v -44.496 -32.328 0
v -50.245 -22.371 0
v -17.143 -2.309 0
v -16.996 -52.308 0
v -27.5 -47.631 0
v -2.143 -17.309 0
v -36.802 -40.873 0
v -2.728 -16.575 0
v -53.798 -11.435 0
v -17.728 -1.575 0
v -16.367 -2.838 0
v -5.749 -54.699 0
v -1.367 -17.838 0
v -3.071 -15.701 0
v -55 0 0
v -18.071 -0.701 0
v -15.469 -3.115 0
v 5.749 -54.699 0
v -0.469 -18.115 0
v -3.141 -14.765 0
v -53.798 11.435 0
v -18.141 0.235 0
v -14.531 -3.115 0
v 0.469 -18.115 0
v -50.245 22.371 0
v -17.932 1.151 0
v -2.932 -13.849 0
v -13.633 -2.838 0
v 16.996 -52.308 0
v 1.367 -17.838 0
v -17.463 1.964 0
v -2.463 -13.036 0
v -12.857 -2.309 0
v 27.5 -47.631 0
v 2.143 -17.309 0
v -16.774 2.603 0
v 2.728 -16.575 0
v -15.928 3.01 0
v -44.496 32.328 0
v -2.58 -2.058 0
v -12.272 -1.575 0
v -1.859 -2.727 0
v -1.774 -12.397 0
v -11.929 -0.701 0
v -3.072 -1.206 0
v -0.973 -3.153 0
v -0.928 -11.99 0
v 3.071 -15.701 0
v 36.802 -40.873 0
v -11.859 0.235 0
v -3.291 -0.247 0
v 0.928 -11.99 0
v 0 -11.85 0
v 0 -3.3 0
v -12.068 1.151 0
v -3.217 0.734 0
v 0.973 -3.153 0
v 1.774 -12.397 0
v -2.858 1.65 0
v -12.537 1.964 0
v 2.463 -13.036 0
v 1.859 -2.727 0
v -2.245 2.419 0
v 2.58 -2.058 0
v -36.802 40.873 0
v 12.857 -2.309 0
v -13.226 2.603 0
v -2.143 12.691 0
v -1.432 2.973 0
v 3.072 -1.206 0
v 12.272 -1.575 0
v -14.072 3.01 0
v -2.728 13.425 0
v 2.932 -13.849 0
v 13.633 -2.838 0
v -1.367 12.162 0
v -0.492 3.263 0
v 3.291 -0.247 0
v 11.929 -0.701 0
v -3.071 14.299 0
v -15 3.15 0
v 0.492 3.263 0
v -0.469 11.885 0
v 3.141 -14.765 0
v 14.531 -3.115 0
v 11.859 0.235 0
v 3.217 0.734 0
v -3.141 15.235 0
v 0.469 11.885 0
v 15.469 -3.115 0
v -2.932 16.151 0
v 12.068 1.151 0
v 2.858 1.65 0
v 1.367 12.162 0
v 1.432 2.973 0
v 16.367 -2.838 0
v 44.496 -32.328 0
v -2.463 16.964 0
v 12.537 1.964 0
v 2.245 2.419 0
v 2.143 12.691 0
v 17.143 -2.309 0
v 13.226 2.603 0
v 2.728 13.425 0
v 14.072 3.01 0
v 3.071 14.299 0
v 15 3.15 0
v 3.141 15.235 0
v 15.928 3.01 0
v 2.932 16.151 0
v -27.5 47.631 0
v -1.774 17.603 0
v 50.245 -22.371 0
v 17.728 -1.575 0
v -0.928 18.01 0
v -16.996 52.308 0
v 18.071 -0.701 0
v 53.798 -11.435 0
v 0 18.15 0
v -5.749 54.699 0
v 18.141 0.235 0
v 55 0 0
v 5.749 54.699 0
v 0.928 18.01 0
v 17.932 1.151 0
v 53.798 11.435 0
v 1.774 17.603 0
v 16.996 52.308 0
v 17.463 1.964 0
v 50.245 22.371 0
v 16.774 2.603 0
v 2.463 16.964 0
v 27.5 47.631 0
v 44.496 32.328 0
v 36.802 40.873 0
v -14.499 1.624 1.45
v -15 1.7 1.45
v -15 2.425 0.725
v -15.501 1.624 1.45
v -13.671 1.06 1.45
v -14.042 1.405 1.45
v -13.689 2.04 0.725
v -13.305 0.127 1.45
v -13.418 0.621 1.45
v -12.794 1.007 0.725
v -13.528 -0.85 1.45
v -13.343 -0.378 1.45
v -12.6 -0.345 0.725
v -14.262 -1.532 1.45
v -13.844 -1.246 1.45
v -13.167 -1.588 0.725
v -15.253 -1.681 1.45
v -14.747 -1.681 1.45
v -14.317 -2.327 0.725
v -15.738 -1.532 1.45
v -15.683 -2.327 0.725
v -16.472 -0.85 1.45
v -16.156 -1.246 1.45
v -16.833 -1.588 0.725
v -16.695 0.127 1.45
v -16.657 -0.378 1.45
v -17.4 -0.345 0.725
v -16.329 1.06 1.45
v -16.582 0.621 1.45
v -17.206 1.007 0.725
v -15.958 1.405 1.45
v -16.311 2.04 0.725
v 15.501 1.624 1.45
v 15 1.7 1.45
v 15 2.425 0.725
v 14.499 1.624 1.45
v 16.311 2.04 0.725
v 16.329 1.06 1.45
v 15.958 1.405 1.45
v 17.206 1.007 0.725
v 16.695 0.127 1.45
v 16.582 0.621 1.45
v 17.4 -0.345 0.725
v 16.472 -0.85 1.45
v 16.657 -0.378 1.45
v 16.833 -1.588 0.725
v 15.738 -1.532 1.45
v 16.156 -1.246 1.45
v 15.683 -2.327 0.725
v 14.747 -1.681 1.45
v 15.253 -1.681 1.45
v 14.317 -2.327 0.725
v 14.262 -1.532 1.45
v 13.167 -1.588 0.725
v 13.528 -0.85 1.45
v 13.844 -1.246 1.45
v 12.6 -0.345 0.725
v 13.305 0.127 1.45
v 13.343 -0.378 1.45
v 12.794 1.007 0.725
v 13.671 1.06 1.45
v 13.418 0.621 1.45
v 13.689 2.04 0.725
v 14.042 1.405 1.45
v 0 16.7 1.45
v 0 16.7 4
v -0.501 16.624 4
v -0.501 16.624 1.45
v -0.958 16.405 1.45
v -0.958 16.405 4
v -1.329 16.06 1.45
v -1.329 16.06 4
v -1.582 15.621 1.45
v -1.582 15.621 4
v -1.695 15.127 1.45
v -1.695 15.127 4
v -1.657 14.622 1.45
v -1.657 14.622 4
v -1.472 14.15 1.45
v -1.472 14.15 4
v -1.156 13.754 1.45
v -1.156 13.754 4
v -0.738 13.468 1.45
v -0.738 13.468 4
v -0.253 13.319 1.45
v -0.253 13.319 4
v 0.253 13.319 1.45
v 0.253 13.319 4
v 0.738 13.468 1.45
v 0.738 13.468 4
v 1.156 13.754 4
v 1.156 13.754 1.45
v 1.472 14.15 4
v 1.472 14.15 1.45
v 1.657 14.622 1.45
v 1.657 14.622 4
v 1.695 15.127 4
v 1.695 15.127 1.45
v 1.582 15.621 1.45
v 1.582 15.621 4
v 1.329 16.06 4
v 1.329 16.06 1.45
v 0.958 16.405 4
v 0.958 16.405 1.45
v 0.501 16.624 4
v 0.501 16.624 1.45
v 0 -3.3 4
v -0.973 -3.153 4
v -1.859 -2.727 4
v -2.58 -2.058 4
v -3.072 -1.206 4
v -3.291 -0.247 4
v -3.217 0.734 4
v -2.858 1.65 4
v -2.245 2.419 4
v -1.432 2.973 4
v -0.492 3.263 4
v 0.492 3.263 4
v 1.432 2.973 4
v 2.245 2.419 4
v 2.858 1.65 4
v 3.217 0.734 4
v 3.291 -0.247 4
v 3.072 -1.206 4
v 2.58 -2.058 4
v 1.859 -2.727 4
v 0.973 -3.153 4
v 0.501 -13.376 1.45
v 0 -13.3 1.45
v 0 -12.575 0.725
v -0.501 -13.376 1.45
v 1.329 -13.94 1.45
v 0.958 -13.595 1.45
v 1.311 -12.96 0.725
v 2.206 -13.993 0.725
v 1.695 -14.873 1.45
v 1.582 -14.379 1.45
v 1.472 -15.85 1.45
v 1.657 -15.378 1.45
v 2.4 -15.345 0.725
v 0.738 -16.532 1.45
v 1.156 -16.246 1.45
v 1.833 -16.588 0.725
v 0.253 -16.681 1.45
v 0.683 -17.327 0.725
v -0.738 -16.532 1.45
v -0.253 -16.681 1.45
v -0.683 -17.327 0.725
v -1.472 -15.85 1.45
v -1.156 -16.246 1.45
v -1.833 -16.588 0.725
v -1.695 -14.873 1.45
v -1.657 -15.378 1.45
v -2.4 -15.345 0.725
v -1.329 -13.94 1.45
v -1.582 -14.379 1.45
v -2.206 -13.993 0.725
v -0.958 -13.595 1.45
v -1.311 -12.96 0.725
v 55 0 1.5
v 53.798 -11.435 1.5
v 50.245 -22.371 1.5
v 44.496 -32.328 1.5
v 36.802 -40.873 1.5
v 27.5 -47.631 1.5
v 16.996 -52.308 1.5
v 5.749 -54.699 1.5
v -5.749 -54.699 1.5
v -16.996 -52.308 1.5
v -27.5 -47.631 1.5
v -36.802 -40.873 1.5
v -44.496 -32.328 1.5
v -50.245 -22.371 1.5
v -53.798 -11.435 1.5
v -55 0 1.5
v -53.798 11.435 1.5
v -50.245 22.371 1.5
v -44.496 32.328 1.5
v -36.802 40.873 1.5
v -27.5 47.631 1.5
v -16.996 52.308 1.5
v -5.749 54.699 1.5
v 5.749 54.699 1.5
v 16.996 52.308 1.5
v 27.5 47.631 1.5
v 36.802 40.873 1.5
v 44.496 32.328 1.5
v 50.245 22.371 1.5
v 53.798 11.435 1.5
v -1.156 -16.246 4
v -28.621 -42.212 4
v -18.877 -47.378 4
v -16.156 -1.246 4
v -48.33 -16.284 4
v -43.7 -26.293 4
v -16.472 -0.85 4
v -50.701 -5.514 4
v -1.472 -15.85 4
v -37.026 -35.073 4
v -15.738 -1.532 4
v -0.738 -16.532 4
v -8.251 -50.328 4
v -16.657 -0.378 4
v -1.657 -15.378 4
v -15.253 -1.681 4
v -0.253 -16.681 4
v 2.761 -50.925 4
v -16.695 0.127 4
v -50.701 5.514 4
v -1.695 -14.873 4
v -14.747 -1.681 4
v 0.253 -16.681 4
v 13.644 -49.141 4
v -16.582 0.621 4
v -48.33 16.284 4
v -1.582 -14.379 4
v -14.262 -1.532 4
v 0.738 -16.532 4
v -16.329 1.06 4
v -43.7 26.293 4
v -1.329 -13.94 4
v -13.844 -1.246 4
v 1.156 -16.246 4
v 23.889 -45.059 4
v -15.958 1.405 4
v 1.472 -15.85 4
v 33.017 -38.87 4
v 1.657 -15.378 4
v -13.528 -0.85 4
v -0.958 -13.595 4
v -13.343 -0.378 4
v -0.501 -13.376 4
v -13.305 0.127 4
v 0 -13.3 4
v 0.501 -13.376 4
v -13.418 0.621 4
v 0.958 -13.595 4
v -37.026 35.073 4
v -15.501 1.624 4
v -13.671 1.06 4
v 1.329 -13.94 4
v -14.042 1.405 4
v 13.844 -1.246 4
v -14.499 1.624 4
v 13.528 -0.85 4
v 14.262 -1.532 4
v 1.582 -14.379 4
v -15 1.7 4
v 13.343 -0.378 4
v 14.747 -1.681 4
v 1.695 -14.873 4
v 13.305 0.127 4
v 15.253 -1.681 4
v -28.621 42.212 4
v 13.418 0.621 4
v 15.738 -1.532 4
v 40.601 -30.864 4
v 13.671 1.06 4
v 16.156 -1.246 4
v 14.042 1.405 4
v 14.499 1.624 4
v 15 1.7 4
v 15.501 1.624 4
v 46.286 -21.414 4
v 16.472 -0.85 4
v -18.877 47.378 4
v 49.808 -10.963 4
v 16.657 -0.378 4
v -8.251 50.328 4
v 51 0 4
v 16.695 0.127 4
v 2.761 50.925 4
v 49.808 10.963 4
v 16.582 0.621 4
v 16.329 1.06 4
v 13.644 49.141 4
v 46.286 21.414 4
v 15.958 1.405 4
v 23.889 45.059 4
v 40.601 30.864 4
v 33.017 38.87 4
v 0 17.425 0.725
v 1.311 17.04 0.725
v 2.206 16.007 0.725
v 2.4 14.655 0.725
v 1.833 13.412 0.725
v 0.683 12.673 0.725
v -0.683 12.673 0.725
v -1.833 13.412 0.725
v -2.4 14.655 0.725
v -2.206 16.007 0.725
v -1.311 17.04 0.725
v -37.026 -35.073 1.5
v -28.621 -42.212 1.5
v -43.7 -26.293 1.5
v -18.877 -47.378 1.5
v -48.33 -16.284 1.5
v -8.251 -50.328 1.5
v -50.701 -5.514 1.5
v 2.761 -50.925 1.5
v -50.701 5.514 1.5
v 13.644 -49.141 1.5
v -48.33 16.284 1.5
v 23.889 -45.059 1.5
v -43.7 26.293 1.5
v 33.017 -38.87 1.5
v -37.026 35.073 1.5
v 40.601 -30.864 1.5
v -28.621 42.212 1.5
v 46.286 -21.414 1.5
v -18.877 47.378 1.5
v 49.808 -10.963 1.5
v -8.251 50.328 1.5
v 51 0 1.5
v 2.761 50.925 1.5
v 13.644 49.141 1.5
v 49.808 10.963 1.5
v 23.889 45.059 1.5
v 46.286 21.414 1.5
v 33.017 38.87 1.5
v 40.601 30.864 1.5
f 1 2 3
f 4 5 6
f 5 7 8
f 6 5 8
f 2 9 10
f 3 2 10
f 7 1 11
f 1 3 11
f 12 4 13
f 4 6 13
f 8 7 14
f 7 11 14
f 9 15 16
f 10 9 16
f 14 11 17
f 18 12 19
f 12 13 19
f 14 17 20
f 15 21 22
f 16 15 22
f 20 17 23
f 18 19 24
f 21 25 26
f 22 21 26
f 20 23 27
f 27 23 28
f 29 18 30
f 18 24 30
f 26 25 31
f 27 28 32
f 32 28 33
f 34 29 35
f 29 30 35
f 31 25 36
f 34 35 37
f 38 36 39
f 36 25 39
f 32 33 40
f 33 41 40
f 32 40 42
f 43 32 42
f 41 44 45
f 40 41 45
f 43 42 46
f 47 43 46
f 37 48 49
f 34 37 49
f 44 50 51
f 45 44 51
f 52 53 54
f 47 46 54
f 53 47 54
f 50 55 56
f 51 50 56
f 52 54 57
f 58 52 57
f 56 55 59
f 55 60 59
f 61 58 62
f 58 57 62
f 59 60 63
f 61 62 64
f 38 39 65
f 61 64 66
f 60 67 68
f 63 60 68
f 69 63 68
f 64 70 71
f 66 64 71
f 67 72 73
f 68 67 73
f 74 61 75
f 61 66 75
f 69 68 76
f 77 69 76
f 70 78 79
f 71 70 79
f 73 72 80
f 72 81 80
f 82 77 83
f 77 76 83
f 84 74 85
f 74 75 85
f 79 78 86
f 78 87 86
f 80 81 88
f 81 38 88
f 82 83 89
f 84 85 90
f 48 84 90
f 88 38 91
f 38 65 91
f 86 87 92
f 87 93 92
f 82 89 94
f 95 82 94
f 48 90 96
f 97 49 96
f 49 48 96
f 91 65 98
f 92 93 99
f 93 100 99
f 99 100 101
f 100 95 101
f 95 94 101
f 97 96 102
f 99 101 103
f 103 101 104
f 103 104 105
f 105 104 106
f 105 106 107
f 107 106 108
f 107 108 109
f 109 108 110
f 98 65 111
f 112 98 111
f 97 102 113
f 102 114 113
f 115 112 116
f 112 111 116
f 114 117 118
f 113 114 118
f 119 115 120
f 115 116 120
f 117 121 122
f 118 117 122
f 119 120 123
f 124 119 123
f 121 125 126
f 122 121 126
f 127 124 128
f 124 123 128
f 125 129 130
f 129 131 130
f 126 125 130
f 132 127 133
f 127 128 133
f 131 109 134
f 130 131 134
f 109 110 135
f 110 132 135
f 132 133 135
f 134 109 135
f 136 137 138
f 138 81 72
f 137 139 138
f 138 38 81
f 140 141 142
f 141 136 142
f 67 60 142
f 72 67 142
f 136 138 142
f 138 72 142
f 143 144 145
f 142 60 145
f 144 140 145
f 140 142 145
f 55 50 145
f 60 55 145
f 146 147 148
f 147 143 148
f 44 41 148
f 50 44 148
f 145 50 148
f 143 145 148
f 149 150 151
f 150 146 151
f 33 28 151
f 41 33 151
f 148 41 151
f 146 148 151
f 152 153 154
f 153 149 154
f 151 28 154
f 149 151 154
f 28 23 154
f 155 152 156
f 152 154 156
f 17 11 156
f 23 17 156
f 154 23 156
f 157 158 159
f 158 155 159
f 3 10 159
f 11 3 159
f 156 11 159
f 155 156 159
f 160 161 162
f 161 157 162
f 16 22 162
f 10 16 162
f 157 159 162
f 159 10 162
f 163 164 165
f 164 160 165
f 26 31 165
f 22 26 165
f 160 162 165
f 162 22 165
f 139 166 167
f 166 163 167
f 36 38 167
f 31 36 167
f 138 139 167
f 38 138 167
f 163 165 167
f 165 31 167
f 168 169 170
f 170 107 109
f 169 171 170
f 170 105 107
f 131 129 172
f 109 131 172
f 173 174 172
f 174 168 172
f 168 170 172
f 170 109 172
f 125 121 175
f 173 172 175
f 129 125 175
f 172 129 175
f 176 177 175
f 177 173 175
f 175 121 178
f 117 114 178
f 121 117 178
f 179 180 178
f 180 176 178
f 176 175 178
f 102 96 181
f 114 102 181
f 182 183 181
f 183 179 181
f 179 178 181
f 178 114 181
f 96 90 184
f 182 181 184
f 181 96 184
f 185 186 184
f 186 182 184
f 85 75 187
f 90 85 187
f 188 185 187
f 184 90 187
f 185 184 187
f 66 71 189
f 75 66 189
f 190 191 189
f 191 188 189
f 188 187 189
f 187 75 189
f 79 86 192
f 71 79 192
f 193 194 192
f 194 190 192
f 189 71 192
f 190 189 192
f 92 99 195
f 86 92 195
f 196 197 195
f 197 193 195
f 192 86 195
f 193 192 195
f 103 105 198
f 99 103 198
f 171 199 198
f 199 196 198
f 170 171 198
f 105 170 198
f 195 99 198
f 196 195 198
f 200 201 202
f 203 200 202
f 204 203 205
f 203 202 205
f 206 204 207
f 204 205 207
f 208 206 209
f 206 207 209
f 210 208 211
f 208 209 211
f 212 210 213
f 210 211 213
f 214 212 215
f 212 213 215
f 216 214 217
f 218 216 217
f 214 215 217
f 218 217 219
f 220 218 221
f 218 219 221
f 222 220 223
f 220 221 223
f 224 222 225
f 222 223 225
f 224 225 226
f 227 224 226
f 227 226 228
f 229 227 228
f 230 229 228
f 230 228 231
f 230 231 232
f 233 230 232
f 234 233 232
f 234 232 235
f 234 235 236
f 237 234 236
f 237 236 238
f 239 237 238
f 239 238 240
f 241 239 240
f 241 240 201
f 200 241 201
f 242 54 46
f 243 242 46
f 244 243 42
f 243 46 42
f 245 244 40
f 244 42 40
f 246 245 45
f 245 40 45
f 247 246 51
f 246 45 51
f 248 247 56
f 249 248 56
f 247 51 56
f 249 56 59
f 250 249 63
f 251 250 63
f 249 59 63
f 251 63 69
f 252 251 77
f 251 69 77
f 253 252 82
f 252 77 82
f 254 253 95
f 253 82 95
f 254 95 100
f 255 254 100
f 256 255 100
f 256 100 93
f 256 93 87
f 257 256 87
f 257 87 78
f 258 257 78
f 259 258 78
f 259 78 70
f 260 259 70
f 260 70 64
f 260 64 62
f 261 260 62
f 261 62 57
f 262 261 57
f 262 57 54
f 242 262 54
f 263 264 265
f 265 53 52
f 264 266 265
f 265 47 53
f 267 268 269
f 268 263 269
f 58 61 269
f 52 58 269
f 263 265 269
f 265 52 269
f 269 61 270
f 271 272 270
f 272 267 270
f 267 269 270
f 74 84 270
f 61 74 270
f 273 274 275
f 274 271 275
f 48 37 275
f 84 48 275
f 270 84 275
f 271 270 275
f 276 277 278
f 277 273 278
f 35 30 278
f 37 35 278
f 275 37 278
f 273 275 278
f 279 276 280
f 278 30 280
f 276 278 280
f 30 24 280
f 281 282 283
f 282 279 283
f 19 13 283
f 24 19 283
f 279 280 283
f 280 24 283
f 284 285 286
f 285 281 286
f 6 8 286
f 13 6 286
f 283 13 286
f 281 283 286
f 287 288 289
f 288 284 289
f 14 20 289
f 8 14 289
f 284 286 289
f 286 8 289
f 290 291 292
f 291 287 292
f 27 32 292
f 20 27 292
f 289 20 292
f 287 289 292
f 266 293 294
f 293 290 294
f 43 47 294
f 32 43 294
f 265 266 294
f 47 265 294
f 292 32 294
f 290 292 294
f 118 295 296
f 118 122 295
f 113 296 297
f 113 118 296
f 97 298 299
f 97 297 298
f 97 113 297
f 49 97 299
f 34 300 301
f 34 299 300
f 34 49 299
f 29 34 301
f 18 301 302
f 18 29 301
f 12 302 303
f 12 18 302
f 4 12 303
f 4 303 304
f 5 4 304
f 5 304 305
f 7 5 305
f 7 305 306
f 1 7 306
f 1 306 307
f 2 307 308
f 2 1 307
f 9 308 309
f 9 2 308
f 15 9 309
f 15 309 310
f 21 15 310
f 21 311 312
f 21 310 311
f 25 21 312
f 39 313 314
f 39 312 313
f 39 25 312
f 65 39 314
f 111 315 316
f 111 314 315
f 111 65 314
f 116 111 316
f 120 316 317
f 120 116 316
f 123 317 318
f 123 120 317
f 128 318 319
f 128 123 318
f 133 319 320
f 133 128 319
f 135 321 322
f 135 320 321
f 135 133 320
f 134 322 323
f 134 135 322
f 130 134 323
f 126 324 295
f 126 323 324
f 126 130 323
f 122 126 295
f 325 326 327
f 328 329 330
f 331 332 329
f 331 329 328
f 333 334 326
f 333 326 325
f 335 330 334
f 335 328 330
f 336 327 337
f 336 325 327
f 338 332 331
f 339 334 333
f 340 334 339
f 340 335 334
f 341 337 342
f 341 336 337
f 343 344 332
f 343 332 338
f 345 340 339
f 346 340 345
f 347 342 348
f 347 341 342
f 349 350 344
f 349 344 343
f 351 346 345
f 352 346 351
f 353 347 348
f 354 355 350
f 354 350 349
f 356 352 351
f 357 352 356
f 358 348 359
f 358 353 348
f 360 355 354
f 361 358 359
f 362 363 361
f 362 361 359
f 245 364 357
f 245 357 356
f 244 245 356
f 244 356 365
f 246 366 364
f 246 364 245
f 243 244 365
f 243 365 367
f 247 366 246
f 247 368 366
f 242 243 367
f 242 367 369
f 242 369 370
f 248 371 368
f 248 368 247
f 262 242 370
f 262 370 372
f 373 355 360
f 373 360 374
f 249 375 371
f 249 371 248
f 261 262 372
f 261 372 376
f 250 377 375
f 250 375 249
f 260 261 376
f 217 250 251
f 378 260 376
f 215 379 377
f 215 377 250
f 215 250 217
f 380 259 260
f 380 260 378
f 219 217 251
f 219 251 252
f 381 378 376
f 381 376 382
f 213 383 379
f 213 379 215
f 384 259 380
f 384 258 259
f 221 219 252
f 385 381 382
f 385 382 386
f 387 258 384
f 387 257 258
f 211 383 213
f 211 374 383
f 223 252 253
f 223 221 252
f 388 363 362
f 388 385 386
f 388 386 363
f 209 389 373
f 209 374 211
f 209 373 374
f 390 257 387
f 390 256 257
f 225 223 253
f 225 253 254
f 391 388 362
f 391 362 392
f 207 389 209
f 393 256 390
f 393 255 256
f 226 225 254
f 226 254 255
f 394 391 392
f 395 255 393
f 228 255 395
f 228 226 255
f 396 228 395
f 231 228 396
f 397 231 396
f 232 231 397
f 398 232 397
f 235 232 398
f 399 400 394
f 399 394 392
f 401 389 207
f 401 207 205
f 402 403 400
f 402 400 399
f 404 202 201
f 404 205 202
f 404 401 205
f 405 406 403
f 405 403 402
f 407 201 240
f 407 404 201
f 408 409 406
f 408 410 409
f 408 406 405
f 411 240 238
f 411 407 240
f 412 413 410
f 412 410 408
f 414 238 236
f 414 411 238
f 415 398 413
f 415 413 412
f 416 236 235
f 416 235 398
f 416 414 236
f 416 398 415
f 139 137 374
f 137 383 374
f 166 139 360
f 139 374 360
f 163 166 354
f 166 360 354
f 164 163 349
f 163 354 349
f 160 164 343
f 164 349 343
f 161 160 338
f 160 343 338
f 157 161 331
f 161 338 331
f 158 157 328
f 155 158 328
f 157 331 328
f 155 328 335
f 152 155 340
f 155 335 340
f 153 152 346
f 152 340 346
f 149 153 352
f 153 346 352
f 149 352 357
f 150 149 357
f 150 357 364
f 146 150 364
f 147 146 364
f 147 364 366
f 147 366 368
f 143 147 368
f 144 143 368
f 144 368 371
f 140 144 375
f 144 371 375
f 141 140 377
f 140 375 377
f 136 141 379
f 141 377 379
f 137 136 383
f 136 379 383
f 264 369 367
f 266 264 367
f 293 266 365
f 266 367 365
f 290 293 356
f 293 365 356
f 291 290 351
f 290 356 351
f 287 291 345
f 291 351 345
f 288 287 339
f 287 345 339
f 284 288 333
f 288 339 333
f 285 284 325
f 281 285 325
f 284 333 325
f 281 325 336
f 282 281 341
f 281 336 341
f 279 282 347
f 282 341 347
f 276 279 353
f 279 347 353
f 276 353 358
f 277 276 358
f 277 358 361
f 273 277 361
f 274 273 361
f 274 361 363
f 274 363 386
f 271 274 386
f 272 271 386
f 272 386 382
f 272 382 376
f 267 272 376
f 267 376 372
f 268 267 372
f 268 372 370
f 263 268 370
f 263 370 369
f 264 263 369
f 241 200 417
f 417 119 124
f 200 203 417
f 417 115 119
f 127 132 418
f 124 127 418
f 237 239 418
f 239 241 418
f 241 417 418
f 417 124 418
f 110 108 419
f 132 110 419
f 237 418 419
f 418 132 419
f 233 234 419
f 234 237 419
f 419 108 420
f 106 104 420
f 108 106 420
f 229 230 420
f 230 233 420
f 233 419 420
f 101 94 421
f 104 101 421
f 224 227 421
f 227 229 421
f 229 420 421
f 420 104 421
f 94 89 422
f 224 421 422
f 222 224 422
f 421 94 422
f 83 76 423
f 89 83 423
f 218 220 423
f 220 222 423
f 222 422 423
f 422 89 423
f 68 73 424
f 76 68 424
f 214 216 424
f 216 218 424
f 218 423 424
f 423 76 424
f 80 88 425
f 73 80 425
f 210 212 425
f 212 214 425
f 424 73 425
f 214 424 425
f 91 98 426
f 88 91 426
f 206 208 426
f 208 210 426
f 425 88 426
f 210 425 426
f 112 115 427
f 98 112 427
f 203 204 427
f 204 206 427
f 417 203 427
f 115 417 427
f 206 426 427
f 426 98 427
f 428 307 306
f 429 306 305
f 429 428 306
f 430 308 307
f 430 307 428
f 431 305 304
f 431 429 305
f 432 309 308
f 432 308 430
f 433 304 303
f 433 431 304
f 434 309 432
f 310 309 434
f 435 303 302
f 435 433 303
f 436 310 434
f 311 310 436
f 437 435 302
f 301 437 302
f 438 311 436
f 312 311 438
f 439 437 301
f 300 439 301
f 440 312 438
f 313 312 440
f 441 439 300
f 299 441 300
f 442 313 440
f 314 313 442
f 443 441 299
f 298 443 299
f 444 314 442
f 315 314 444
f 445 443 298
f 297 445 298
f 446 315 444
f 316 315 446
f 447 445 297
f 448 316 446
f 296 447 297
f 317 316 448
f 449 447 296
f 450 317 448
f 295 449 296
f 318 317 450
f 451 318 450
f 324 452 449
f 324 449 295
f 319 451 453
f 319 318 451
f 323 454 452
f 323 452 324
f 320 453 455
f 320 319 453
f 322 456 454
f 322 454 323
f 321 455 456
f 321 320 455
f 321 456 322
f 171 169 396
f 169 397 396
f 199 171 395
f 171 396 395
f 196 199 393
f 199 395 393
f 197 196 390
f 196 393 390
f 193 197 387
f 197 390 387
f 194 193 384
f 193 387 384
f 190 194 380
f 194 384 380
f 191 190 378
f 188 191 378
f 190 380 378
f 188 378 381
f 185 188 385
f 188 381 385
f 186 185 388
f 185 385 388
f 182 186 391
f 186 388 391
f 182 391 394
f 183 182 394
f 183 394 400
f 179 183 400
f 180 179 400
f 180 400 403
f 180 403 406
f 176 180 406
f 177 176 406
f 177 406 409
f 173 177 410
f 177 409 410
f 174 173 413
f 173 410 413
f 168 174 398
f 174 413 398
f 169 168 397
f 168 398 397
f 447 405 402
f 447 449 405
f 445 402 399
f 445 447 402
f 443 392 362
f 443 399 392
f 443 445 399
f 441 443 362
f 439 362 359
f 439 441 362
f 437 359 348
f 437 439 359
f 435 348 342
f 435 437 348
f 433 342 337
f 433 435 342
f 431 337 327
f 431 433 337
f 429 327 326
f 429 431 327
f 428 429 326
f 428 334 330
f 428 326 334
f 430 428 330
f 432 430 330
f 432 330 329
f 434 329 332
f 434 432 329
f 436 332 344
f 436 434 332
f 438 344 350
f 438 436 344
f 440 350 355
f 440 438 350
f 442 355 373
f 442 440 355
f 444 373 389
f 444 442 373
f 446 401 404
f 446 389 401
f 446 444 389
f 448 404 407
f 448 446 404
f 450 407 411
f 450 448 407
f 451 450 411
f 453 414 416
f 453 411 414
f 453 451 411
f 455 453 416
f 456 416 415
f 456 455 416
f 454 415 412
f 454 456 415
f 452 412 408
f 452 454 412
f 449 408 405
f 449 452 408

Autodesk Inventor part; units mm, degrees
ref_plane "YZ Plane" through (0, 0, 0) normal (1, 0, 0) x (0, 1, 0)
ref_plane "XZ Plane" through (0, 0, 0) normal (0, 1, 0) x (-1, 0, 0)
ref_plane "XY Plane" through (0, 0, 0) normal (0, 0, 1) x (1, 0, 0)
sketch "Sketch1" plane through (0, 0, 0) normal (0, 0, 1) x (1, 0, 0)
  circle A0 centre (0, 0) radius 55
  dimension "d0" = 110
extrude "Extrusion1" add sketch "Sketch1" along normal blind 1.5
sketch "Sketch2" plane through (0, 0, 1.5) normal (0, 0, 1) x (1, 0, 0)
  circle A0 centre (0, 0) radius 51
  dimension "d3" = 102
extrude "Extrusion2" add sketch "Sketch2" along normal blind 2.5
sketch "Sketch4" plane through (0, 0, 4) normal (0, 0, 1) x (1, 0, 0)
  point P0 (0, 0)
  point P1 (0, 0)
hole "Hole1" at (0, 0, 4) direction (0, 0, -1) diameter 6.6 end through all clearance for "Hex Head Cap Screw DIN EN 24017" size "M6" standard "DIN"
sketch "Sketch5" plane through (0, 0, 0) normal (0, 0, -1) x (-1, 0, 0)
  circle A0 centre (0, 0) radius 15 construction
  point P0 (0, -15)
  point P1 (-15, 0)
  point P2 (0, 15)
  point P3 (15, 0)
  dimension "d13" = 30
hole "Hole2" at (0, -15, 0) at (15, 0, 0) at (0, 15, 0) at (-15, 0, 0) direction (0, 0, 1) diameter 3.4 depth 8 tip angle 118 countersink diameter 6.3 countersink angle 90 clearance for "Countersunk Flat Head Screw DIN EN ISO 2009" size "M3" standard "DIN"
properties part number "Seconday_End_Top" material "Polycarbonate, Clear"
